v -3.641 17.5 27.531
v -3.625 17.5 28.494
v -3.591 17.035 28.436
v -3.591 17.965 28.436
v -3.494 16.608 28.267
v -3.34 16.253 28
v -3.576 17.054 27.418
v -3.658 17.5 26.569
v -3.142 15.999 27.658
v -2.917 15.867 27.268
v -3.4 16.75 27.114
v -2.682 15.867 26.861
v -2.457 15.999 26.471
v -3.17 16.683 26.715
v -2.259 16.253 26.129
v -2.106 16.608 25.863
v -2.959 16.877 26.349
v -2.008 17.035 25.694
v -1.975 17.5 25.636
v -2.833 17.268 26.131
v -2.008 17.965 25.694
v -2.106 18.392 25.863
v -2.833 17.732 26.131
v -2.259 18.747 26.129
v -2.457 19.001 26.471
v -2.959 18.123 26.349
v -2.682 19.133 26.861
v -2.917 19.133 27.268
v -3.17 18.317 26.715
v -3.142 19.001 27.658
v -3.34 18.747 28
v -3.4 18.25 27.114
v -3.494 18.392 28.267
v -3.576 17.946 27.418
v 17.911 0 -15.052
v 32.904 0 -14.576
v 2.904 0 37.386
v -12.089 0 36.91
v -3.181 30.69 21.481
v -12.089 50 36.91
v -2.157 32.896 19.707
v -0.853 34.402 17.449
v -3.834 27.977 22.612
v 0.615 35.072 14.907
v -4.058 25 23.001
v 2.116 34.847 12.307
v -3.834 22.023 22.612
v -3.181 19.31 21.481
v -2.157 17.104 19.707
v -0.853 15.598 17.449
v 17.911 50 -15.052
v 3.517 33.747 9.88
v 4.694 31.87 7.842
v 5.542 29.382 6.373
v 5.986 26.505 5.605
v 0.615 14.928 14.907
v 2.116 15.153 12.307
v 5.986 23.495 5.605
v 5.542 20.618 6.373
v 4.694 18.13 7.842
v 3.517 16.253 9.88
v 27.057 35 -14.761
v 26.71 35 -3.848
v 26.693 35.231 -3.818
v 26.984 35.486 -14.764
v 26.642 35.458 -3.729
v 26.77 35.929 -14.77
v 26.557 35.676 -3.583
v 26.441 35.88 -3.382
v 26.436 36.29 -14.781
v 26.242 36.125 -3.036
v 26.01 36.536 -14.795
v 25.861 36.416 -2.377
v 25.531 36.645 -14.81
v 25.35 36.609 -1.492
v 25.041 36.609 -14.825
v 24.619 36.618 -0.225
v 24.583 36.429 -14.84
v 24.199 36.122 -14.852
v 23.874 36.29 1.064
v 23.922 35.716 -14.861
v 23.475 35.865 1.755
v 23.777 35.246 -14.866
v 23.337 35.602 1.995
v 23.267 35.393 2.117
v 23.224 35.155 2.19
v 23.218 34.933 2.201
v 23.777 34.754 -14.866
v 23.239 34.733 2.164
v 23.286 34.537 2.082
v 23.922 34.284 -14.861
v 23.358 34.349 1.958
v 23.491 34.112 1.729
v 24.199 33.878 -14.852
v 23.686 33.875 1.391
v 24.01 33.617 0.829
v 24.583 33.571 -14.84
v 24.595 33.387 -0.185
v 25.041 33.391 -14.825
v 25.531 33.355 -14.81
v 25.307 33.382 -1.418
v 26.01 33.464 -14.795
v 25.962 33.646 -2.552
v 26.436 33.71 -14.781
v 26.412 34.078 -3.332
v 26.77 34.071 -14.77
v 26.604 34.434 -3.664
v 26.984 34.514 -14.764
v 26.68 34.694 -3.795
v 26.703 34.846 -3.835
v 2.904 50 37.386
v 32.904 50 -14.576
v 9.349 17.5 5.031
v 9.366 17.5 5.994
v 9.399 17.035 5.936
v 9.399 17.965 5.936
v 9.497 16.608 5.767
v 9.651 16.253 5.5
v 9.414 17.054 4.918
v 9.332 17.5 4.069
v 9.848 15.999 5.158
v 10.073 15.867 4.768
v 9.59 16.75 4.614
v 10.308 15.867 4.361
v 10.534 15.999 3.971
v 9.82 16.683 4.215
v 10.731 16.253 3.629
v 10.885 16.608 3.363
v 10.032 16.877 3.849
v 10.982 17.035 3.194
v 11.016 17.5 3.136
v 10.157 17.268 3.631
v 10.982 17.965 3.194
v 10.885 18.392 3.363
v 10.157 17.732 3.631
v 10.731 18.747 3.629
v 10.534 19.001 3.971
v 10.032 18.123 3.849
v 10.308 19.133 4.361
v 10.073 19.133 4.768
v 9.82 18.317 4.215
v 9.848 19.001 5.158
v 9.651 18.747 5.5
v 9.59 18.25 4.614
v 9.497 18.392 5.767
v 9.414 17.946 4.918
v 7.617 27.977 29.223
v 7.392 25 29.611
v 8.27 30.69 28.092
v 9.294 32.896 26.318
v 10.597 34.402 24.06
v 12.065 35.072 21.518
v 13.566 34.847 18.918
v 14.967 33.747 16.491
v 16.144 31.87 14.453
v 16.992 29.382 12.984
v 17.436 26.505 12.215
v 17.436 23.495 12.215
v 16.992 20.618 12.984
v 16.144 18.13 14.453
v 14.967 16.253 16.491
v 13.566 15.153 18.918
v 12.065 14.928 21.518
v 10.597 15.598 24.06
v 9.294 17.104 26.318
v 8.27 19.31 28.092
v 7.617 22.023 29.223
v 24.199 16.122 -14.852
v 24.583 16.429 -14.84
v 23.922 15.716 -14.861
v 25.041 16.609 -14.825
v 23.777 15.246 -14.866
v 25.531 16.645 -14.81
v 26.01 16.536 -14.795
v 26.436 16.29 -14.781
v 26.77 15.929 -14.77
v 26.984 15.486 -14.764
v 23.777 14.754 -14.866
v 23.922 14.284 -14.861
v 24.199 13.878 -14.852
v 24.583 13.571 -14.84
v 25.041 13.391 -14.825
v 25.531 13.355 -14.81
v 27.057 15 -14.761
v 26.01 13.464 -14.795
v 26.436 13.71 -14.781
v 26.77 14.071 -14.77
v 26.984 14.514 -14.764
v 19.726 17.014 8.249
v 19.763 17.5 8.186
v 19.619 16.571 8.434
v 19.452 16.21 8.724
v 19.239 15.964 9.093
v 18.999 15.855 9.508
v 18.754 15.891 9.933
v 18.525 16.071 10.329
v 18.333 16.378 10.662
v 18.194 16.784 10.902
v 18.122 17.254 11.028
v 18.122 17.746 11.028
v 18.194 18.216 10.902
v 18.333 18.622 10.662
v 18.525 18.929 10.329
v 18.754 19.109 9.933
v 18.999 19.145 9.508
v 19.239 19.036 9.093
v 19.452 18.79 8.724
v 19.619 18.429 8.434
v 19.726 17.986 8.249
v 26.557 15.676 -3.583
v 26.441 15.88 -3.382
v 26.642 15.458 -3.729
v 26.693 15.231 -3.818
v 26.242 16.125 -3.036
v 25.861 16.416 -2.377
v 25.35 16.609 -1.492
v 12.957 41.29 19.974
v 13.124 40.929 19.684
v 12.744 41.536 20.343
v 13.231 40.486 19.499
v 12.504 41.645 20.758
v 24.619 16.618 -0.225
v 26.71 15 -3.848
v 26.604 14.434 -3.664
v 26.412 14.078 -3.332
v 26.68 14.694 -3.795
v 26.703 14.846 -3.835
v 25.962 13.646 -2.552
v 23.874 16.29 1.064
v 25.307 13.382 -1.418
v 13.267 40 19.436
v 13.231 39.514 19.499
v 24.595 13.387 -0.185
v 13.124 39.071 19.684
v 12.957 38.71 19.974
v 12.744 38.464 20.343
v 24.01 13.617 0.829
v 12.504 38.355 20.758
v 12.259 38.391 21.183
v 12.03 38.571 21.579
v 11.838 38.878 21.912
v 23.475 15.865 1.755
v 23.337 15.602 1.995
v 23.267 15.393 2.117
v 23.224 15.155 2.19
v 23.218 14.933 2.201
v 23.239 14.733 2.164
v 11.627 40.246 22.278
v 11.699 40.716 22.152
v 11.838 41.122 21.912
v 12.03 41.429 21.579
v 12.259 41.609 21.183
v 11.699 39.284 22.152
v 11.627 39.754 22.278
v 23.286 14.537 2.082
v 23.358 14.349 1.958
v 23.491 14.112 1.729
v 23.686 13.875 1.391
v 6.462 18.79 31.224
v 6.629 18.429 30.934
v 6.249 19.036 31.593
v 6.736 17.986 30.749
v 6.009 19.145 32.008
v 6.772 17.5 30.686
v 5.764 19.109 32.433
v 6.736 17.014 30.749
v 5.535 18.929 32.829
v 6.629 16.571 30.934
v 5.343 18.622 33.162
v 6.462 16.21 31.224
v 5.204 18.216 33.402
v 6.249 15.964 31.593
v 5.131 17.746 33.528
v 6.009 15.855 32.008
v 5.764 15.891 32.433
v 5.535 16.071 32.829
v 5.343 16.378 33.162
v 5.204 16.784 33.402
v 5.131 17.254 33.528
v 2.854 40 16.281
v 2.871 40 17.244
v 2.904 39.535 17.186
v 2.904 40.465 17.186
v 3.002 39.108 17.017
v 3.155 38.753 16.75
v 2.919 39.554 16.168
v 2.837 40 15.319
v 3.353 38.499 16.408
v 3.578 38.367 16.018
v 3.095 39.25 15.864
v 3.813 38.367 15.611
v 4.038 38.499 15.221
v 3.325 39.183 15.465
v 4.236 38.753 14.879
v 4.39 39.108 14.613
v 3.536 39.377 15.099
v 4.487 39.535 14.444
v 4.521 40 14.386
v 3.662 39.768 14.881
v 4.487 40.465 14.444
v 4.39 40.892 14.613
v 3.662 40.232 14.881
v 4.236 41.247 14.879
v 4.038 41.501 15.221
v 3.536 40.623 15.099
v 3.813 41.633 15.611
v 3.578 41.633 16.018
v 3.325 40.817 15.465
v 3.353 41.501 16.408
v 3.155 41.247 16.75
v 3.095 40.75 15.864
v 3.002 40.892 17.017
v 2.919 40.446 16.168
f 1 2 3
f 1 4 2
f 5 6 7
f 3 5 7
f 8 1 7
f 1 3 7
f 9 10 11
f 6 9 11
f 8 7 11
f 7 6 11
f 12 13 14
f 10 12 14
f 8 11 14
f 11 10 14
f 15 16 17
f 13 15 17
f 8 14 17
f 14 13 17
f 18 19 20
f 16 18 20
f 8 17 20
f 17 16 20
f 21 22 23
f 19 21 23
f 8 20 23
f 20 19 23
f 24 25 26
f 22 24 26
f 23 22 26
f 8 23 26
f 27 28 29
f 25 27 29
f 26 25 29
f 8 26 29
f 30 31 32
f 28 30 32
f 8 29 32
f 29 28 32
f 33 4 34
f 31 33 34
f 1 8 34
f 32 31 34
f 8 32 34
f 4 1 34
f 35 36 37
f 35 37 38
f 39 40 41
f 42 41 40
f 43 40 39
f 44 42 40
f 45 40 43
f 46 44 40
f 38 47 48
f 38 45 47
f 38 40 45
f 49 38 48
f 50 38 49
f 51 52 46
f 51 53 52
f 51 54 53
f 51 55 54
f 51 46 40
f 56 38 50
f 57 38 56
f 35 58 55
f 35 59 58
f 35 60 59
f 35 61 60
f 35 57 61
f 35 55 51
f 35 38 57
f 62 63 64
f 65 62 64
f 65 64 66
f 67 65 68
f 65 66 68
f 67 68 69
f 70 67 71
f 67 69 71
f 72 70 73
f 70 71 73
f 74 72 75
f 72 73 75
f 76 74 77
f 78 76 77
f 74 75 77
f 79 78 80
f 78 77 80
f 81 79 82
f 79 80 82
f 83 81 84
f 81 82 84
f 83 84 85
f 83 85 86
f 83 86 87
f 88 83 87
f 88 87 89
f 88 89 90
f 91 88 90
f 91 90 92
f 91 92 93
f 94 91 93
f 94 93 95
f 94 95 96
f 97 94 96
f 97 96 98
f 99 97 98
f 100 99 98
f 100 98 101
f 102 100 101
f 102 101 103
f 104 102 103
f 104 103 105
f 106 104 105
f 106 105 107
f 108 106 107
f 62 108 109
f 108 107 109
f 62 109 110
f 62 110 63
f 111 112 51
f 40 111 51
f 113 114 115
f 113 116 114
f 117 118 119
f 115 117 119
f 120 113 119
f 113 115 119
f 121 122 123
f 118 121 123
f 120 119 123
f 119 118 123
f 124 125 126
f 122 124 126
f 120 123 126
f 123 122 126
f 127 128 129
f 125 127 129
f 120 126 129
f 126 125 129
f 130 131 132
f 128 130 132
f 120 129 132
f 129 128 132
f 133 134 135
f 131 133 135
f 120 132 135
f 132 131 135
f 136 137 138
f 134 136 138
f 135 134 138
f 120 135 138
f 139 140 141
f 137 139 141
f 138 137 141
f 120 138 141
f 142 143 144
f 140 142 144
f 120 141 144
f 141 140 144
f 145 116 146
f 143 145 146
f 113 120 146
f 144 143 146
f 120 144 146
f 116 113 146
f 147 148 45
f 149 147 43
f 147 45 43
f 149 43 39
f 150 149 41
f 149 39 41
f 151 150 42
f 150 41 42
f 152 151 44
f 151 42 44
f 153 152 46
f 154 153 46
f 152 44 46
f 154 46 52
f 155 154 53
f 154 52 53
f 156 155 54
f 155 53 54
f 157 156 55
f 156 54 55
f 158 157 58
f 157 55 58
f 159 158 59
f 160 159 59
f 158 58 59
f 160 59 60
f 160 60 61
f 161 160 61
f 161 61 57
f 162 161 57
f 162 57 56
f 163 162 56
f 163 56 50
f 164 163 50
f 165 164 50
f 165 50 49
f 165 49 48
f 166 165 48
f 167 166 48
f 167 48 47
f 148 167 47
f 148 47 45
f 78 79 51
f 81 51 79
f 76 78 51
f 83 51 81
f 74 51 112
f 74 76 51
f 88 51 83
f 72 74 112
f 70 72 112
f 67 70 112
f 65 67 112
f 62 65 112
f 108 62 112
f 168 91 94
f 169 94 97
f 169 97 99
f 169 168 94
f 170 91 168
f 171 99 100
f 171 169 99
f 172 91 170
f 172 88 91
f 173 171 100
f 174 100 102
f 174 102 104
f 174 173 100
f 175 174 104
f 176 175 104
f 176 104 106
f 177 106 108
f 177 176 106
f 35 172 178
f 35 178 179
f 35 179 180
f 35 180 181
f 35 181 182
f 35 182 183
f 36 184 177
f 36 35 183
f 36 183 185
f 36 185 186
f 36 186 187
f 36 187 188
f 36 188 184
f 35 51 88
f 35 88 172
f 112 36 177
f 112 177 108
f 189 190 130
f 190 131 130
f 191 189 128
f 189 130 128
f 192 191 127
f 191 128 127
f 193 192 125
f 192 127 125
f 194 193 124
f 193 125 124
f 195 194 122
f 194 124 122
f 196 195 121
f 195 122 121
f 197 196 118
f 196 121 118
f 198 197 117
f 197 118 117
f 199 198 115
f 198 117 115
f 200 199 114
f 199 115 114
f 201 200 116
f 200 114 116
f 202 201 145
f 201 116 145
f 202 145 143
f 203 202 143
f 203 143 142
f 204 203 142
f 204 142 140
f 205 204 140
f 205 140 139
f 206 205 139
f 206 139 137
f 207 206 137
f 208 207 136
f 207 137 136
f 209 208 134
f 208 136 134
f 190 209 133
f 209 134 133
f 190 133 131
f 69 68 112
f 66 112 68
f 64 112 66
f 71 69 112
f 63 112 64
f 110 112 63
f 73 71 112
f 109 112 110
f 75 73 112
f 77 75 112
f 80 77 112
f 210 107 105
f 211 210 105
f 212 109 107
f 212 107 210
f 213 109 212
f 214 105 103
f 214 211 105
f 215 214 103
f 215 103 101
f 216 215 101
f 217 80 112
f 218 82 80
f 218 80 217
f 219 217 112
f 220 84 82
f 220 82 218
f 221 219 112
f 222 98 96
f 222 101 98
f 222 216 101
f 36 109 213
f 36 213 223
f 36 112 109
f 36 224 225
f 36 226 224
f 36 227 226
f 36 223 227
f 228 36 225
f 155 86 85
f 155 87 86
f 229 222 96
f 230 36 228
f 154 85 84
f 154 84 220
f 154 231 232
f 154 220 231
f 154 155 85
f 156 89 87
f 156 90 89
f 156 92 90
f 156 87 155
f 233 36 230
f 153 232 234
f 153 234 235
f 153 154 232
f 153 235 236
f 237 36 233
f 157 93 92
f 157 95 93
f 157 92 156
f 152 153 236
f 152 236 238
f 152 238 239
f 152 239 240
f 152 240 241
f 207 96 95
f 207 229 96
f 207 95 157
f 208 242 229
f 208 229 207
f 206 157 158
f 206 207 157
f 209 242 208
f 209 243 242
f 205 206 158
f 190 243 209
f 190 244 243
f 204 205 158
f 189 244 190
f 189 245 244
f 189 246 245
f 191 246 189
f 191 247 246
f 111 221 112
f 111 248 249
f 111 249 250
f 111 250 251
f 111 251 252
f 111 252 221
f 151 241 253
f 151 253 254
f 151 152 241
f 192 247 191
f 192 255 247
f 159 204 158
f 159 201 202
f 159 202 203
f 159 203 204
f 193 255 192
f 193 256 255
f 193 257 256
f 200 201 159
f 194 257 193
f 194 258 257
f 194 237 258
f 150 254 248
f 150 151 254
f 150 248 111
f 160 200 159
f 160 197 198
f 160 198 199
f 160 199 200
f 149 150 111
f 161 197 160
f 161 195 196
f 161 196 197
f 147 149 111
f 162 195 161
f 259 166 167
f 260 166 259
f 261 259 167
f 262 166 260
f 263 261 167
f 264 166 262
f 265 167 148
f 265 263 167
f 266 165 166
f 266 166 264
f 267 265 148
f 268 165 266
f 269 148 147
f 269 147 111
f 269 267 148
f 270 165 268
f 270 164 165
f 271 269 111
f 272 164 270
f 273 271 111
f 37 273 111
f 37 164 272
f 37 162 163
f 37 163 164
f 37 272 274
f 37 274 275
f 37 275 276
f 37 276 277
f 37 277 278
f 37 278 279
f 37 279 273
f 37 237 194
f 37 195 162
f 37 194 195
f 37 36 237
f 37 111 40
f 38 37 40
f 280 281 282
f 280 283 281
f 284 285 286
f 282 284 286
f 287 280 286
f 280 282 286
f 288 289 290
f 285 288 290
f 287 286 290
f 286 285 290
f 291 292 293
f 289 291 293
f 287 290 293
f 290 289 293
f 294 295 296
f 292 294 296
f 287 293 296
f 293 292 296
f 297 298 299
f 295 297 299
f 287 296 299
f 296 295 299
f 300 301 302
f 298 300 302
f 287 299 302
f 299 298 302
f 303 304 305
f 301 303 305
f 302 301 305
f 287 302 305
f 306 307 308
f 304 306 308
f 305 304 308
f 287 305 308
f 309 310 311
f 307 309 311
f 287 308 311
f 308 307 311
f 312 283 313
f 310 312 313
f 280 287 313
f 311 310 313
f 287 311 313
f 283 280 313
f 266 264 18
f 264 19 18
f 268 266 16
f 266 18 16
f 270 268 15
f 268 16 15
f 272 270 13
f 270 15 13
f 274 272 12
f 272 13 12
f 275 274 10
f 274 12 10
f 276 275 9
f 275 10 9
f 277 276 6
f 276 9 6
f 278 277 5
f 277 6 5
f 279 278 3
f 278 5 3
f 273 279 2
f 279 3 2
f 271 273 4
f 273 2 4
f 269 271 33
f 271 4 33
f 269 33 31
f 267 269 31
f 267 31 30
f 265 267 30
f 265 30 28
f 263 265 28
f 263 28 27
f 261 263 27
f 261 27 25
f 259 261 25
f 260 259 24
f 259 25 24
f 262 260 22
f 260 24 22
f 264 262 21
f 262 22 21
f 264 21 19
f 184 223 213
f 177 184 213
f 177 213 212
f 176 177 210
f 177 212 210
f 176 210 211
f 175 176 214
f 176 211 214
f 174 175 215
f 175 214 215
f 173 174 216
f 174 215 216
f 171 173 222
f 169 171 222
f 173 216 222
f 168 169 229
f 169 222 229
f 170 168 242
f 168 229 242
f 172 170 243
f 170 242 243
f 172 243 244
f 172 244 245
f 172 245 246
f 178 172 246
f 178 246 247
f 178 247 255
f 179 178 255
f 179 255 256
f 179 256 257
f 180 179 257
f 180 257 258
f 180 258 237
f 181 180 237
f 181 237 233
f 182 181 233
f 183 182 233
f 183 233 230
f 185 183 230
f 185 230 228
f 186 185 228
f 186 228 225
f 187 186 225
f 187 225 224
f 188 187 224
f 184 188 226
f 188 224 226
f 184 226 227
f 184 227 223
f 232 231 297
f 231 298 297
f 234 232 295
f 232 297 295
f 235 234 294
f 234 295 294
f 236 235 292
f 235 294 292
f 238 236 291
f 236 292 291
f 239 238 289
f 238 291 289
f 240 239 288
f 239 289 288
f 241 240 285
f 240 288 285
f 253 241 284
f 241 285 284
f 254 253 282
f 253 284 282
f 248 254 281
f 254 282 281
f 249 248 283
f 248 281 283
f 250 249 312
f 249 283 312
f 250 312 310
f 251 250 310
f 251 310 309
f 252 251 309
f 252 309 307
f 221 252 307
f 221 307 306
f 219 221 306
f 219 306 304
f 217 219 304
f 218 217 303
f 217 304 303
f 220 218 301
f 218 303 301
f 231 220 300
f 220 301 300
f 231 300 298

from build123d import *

# Parameters (mm, degrees)
EXTRUDE_1_DEPTH        = 50
HOLE_WIZARD_M4_1_D     = 3.3
HOLE_WIZARD_M4_1_DEPTH = 10.1
HOLE_WIZARD_M4_1_TIP   = 0.991420021
SKETCH_2_R             = 10.1
CUT_EXTRUDE_1_DEPTH    = 50
HOLE_WIZARD_M4_2_D     = 3.3


with BuildPart() as part:
    # 草图1 → 凸台-拉伸1 (new body)
    with BuildSketch(Plane(origin=(0, 0, 0), x_dir=(1, 0, 0), z_dir=(0, 1, 0))):
        Polygon((-12.088519272, -36.909676467), (17.911480728, 15.05184776), (32.903920346, 14.575660494), (2.903920346, -37.385863733), align=None)
    extrude(amount=EXTRUDE_1_DEPTH)

    # M4 螺纹孔1
    with Locations(Plane(origin=(10.045844782, 0, 25.015687746), x_dir=(-0.5, 0, 0.866025404), z_dir=(0.866025404, 0, 0.5))):
        with Locations((-17.783614548, -17.5), (-4.793233491, -40), (8.197147566, -17.5)):
            Hole(HOLE_WIZARD_M4_1_D / 2, depth=HOLE_WIZARD_M4_1_DEPTH)
            with Locations((0, 0, -(HOLE_WIZARD_M4_1_DEPTH + HOLE_WIZARD_M4_1_TIP / 2))):  # 118° drill point
                Cone(0, HOLE_WIZARD_M4_1_D / 2, HOLE_WIZARD_M4_1_TIP, mode=Mode.SUBTRACT)

    # 草图2 → 切除-拉伸1 (cut)
    with BuildSketch(Plane(origin=(-1.404680066, 0, 18.404724143), x_dir=(-0.5, 0, 0.866025404), z_dir=(-0.866025404, 0, -0.5))):
        with Locations((-4.793233491, 25)):
            Circle(SKETCH_2_R)
    extrude(amount=-CUT_EXTRUDE_1_DEPTH, mode=Mode.SUBTRACT)

    # M4 螺纹孔2 (through all)
    with Locations(Plane(origin=(0.495643511, 0, -15.60500656), x_dir=(-0.999495975, 0, -0.031745818), z_dir=(0.031745818, 0, -0.999495975))):
        with Locations((-24.92461967, 35), (-24.92461967, 15)):
            Hole(HOLE_WIZARD_M4_2_D / 2)


solid = part.part
